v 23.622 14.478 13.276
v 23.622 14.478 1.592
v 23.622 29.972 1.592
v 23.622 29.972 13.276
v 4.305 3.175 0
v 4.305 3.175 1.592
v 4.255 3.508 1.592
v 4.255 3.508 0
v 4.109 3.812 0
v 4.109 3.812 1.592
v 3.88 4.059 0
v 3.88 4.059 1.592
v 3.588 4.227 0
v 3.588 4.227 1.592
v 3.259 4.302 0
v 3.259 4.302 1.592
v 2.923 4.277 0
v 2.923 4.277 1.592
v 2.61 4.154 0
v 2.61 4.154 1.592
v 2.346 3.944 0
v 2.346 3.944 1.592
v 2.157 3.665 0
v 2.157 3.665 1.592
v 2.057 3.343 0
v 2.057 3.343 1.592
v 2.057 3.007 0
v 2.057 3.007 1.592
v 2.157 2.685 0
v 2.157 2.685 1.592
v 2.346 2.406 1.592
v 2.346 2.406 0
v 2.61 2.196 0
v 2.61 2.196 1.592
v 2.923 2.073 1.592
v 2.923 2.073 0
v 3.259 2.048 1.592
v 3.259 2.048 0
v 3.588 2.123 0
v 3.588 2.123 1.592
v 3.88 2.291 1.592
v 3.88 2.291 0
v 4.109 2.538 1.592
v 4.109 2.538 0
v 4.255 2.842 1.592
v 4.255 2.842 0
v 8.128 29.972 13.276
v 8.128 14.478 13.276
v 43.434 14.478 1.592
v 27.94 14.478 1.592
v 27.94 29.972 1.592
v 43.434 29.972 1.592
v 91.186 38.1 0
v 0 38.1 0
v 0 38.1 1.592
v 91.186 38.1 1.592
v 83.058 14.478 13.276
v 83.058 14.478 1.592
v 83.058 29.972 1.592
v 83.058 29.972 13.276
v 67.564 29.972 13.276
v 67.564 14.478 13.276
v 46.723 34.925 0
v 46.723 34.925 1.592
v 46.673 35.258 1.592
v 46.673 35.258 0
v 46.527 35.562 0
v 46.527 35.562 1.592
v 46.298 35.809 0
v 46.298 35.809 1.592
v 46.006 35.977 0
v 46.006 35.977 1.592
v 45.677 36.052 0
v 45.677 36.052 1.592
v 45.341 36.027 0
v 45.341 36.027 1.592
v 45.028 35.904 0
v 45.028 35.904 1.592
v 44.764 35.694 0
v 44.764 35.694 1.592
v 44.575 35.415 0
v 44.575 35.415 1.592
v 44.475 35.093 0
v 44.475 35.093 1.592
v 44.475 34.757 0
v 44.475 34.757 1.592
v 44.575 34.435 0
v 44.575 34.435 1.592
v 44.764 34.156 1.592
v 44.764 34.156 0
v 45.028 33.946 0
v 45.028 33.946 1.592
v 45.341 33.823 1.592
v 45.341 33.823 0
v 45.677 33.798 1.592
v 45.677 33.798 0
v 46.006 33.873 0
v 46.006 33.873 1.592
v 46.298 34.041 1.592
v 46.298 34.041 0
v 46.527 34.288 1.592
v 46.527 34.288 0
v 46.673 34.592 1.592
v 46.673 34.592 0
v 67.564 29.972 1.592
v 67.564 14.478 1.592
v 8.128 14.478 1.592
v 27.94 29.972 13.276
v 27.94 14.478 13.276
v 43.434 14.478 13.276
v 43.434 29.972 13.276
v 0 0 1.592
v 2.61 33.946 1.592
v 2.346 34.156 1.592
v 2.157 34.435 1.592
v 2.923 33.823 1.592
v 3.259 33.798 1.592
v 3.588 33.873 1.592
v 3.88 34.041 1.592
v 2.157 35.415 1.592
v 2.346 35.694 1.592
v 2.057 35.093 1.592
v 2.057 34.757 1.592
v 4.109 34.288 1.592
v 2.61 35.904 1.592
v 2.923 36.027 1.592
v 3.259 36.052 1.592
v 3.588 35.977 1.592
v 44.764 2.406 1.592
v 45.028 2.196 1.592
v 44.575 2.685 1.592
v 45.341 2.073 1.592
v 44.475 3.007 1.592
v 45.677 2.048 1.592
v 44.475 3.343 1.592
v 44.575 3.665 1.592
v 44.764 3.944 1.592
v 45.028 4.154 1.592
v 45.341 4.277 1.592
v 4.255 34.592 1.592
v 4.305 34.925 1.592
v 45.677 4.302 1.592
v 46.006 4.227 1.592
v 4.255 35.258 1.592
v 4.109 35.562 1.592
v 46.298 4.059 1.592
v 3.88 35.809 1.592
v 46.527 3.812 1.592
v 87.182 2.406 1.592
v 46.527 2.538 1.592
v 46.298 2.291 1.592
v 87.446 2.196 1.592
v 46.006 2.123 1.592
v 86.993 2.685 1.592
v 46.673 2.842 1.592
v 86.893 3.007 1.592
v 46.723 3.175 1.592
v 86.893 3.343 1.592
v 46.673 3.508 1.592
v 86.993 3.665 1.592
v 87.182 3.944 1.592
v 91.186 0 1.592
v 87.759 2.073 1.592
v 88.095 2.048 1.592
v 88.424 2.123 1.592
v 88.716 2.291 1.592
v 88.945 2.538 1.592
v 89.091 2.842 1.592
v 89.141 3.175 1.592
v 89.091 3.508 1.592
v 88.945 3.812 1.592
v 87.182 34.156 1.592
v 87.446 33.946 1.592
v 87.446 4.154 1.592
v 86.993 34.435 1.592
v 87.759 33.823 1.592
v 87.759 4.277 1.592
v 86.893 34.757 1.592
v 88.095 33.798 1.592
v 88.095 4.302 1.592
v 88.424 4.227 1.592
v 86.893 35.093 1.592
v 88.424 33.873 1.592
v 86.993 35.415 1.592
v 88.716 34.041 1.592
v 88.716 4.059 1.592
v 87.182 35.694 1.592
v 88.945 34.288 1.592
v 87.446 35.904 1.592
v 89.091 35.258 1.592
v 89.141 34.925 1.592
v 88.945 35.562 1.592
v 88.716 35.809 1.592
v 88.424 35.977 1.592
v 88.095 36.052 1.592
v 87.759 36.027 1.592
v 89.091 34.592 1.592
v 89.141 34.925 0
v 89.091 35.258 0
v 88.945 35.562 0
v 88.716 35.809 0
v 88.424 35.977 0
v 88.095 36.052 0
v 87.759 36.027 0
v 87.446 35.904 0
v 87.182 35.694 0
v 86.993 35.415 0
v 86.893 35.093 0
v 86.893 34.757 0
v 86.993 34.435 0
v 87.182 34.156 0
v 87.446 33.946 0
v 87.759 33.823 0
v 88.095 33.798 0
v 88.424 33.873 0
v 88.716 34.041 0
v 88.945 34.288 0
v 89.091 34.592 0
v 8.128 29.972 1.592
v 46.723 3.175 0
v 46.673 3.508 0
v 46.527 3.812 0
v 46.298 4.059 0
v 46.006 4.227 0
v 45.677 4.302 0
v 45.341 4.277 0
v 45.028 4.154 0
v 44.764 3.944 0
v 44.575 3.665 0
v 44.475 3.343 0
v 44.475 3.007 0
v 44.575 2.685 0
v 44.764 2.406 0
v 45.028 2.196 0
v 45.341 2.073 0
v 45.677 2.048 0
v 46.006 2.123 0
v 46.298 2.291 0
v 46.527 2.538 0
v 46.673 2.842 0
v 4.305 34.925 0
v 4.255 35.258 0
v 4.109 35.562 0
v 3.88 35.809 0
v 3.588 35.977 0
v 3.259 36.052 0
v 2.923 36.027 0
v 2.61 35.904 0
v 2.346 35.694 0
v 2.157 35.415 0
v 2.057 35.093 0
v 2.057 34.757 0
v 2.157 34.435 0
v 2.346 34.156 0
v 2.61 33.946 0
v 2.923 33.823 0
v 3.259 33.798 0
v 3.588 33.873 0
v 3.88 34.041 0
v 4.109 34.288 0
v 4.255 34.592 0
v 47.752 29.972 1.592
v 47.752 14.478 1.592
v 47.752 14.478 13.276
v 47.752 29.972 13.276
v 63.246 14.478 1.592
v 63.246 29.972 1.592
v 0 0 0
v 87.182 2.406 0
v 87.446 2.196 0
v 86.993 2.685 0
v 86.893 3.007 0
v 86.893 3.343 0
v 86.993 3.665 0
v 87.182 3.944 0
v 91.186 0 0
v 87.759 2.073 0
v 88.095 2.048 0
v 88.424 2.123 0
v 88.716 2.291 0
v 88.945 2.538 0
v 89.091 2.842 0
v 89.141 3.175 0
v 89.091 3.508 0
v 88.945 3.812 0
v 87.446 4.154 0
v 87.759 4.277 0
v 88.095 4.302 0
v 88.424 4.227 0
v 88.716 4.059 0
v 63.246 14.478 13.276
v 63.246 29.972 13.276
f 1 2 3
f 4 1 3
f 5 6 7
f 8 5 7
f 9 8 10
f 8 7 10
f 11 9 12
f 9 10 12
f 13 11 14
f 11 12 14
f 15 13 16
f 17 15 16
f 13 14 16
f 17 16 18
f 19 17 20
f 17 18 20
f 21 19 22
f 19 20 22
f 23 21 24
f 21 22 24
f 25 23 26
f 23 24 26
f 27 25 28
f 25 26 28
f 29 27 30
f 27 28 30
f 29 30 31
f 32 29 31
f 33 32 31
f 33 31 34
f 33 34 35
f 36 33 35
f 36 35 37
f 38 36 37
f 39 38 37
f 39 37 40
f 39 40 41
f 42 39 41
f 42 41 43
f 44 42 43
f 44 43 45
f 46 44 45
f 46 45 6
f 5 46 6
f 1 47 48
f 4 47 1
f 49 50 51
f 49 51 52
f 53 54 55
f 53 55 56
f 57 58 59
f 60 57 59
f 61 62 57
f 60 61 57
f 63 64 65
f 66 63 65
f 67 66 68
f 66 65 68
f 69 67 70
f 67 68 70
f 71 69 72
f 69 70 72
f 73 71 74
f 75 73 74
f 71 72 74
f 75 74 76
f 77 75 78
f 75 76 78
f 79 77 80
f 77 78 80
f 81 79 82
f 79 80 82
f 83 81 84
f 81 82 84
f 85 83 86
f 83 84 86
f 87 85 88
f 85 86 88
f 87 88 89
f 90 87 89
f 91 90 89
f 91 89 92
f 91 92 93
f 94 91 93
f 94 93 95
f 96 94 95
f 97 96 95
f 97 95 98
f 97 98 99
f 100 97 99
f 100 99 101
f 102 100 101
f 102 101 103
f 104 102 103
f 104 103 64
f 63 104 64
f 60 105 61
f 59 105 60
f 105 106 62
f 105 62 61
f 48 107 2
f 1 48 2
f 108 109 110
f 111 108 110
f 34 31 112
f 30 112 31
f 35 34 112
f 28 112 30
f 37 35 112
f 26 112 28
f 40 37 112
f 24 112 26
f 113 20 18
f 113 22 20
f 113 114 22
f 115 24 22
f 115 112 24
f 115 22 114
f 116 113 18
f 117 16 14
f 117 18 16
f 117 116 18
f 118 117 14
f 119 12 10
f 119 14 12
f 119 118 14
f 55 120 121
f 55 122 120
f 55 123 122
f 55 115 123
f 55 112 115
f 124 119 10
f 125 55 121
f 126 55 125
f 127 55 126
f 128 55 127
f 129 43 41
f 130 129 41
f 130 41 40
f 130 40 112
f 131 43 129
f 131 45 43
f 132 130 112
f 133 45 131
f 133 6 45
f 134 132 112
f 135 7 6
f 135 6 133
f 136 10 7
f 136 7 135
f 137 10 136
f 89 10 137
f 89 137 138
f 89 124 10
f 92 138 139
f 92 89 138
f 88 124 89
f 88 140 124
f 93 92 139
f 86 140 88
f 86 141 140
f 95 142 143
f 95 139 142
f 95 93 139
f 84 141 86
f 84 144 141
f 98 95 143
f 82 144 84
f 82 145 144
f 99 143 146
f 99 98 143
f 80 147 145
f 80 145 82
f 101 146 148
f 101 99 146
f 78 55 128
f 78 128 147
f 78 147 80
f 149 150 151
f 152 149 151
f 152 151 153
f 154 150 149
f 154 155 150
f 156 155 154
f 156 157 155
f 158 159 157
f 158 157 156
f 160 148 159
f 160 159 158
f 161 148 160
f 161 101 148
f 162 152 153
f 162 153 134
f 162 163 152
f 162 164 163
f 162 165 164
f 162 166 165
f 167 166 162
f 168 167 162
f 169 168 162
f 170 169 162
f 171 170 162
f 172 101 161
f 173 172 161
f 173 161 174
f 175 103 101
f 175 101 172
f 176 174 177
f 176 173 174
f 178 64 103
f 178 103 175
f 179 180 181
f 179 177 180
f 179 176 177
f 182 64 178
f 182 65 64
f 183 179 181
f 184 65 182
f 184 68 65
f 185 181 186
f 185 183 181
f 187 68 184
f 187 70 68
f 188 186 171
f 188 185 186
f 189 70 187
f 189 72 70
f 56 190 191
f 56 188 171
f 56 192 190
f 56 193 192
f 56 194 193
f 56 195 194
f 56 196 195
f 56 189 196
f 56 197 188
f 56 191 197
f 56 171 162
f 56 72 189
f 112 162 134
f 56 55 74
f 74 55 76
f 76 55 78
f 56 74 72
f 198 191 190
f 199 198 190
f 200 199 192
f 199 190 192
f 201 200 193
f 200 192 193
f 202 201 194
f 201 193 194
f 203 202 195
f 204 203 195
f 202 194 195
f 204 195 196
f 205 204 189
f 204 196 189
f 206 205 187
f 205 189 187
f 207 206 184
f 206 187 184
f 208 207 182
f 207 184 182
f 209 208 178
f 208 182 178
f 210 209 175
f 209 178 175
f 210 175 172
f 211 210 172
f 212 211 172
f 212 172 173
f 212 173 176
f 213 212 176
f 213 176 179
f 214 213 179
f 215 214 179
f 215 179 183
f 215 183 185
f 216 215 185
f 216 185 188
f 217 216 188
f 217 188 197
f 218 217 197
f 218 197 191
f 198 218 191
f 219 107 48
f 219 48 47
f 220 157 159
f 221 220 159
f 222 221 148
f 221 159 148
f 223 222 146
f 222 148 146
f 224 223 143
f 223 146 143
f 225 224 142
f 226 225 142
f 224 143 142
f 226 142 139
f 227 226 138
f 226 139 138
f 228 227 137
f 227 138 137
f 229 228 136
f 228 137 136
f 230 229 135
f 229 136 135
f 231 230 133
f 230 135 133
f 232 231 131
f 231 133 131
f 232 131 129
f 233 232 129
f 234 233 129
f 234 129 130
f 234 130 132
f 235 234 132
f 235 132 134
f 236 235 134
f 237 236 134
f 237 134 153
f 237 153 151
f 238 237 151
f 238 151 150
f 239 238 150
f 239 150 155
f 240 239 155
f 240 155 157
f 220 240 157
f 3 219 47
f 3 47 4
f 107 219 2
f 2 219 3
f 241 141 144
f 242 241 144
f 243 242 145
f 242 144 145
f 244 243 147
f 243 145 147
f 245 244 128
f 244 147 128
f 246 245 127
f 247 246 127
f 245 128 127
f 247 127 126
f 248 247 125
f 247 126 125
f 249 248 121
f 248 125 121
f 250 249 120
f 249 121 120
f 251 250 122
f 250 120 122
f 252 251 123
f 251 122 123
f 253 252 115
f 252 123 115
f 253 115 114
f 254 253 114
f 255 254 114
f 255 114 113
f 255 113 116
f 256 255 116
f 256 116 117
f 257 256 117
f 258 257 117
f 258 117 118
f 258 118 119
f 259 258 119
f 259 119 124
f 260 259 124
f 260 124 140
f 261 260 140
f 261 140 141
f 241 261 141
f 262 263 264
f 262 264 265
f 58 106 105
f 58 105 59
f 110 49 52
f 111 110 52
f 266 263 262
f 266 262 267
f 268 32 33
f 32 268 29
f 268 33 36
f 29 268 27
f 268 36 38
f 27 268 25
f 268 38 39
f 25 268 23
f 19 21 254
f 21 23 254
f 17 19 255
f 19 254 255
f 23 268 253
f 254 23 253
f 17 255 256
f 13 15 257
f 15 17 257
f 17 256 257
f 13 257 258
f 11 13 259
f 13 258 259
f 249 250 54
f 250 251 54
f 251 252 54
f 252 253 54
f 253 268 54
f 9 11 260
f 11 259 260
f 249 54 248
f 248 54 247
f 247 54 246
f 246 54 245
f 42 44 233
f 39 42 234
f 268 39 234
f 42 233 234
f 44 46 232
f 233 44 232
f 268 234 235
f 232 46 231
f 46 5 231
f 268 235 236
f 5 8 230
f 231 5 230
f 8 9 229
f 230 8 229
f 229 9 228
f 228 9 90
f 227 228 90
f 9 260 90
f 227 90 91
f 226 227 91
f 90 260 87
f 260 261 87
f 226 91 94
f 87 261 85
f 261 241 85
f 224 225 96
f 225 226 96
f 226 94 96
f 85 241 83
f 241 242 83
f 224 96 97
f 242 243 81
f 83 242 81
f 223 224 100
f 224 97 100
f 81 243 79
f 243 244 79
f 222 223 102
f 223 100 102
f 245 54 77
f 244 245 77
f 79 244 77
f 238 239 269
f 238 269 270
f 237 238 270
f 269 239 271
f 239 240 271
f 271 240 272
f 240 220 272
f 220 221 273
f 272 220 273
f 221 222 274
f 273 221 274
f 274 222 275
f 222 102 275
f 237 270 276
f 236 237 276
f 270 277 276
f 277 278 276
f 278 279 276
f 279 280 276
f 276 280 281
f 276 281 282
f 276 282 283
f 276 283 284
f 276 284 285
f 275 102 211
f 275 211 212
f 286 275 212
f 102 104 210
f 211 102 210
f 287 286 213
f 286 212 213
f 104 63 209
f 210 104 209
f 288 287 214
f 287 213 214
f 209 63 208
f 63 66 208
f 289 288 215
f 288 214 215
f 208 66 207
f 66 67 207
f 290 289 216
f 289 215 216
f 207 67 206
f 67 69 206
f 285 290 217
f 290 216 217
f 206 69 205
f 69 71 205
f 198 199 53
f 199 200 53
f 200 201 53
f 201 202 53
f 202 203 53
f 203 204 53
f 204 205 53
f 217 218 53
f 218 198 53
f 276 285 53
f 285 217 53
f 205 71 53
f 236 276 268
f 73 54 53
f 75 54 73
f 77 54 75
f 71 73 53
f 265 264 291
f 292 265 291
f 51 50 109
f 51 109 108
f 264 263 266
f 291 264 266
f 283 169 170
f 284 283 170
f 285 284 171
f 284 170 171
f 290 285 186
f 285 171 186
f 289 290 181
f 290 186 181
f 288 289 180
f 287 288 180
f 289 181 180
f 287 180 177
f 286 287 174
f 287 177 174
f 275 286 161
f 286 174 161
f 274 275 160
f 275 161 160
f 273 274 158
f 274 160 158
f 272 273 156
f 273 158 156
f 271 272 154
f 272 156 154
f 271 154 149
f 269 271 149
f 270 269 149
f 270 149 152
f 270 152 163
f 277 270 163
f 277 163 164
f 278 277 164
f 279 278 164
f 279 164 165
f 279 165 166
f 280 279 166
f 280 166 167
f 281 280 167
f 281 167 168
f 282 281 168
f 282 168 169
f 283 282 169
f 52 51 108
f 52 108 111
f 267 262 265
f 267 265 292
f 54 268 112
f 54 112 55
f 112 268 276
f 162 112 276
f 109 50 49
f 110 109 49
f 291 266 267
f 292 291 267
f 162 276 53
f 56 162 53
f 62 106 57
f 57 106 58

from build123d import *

# Parameters (mm, degrees)
SKETCH1_W          = 91.186
SKETCH1_H          = 38.1
BOARD_DEPTH        = 1.592072
SKETCH3_W          = 15.494
SKETCH3_H          = 15.494
MX1A_1_DEPTH       = 11.684
SKETCH4_W          = 15.494
SKETCH4_H          = 15.494
MX1A_2_DEPTH       = 11.684
SKETCH5_W          = 15.494
SKETCH5_H          = 15.494
MX1A_3_DEPTH       = 11.684
SKETCH6_W          = 15.494
SKETCH6_H          = 15.494
MX1A_4_DEPTH       = 11.684
SKETCH7_R          = 1.1303
CUT_EXTRUDE1_DEPTH = 10


with BuildPart() as part:
    # Sketch1 → BOARD (new body)
    with BuildSketch(Plane.XY):
        with Locations((45.593, 19.05)):
            Rectangle(SKETCH1_W, SKETCH1_H)
    extrude(amount=BOARD_DEPTH)

    # Sketch7 → Cut-Extrude1 (cut)
    with BuildSketch(Plane.XY.offset(1.592072)):
        with Locations((88.011, 34.925)):
            Circle(SKETCH7_R)
        with Locations((88.011, 3.175)):
            Circle(SKETCH7_R)
        with Locations((45.593, 34.925)):
            Circle(SKETCH7_R)
        with Locations((45.593, 3.175)):
            Circle(SKETCH7_R)
        with Locations((3.175, 34.925)):
            Circle(SKETCH7_R)
        with Locations((3.175, 3.175)):
            Circle(SKETCH7_R)
    extrude(amount=-CUT_EXTRUDE1_DEPTH, mode=Mode.SUBTRACT)


with BuildPart() as body_2:
    # Sketch3 → MX1A-1 (new body)
    with BuildSketch(Plane.XY.offset(1.592072)):
        with Locations((75.311, 22.225)):
            Rectangle(SKETCH3_W, SKETCH3_H)
    extrude(amount=MX1A_1_DEPTH)


with BuildPart() as body_3:
    # Sketch4 → MX1A-2 (new body)
    with BuildSketch(Plane.XY.offset(1.592072)):
        with Locations((55.499, 22.225)):
            Rectangle(SKETCH4_W, SKETCH4_H)
    extrude(amount=MX1A_2_DEPTH)


with BuildPart() as body_4:
    # Sketch5 → MX1A-3 (new body)
    with BuildSketch(Plane.XY.offset(1.592072)):
        with Locations((35.687, 22.225)):
            Rectangle(SKETCH5_W, SKETCH5_H)
    extrude(amount=MX1A_3_DEPTH)


with BuildPart() as body_5:
    # Sketch6 → MX1A-4 (new body)
    with BuildSketch(Plane.XY.offset(1.592072)):
        with Locations((15.875, 22.225)):
            Rectangle(SKETCH6_W, SKETCH6_H)
    extrude(amount=MX1A_4_DEPTH)


solid = Compound([part.part, body_2.part, body_3.part, body_4.part, body_5.part])
